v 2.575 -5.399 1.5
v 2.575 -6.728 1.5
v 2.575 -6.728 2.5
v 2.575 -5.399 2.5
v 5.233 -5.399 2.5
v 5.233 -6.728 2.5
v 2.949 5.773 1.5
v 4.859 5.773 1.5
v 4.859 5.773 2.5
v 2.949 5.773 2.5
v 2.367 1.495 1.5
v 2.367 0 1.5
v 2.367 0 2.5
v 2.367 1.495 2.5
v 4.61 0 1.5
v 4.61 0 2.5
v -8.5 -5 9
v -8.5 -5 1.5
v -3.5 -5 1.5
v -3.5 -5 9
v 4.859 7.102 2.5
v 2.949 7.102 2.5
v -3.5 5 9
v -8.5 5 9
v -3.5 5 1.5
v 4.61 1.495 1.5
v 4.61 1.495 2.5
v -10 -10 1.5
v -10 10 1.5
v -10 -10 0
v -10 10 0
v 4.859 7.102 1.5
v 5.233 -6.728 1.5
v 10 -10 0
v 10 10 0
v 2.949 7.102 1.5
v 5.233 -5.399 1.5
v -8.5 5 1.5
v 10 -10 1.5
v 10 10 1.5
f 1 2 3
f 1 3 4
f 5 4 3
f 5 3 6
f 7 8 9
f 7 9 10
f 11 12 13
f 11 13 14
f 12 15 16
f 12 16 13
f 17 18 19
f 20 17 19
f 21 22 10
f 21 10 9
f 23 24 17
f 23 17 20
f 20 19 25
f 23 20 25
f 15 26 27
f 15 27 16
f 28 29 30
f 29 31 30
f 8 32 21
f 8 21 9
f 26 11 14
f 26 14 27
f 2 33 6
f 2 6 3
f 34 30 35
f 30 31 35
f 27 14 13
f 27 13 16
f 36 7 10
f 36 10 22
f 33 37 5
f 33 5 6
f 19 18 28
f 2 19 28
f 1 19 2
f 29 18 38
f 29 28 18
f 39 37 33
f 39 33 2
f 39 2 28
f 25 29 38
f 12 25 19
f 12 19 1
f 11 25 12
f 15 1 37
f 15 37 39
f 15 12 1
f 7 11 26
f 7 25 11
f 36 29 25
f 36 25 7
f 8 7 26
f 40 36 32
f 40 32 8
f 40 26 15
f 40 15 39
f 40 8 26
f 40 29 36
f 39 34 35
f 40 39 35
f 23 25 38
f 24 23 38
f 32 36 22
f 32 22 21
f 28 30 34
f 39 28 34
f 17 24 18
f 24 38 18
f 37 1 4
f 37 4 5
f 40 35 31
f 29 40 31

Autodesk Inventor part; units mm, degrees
ref_plane "YZ Plane" through (0, 0, 0) normal (1, 0, 0) x (0, 1, 0)
ref_plane "XZ Plane" through (0, 0, 0) normal (0, 1, 0) x (-1, 0, 0)
ref_plane "XY Plane" through (0, 0, 0) normal (0, 0, 1) x (1, 0, 0)
sketch "Sketch1" plane through (0, 0, 0) normal (0, 0, 1) x (1, 0, 0)
  line L0 (-10, -10) -> (10, -10)
  line L1 (10, -10) -> (10, 10)
  line L2 (10, 10) -> (-10, 10)
  line L3 (-10, 10) -> (-10, -10)
  line L4 (-10, -10) -> (10, 10) construction
  line L5 (10, -10) -> (-10, 10) construction
  point P0 (0, 0)
  dimension "d0" = 20
  dimension "d1" = 20
extrude "Extrusion1" add sketch "Sketch1" along normal blind 1.5
sketch "Sketch2" plane through (0, 0, 1.5) normal (0, 0, 1) x (1, 0, 0)
  line L0 (-14, 0) -> (14, 0) projected
  line L1 (-8.5, -5) -> (-3.5, -5)
  line L2 (-3.5, -5) -> (-3.5, 5)
  line L3 (-3.5, 5) -> (-8.5, 5)
  line L4 (-8.5, 5) -> (-8.5, -5)
  line L5 (-8.5, -5) -> (-3.5, 5) construction
  line L6 (-3.5, -5) -> (-8.5, 5) construction
  line L7 (-10, 10) -> (-10, -10) projected
  point P0 (0, 0)
  point P1 (-6, 0)
  dimension "d4" = 1.5
  dimension "d5" = 10
  dimension "d6" = 5
extrude "Extrusion2" add sketch "Sketch2" along normal blind 7.5
sketch "Sketch3" plane through (0, 0, 1.5) normal (0, 0, 1) x (1, 0, 0)
  line L0 (2.9488, 7.102) -> (4.8593, 7.102)
  line L1 (4.8593, 7.102) -> (4.8593, 5.773)
  line L2 (4.8593, 5.773) -> (2.9488, 5.773)
  line L3 (2.9488, 5.773) -> (2.9488, 7.102)
  line L4 (2.9488, 7.102) -> (4.8593, 5.773) construction
  line L5 (4.8593, 7.102) -> (2.9488, 5.773) construction
  line L6 (2.3673, 1.4952) -> (4.6101, 1.4952)
  line L7 (4.6101, 1.4952) -> (4.6101, 0)
  line L8 (4.6101, 0) -> (2.3673, 0)
  line L9 (2.3673, 0) -> (2.3673, 1.4952)
  line L10 (2.3673, 1.4952) -> (4.6101, 0) construction
  line L11 (4.6101, 1.4952) -> (2.3673, 0) construction
  line L12 (2.575, -5.3992) -> (5.233, -5.3992)
  line L13 (5.233, -5.3992) -> (5.233, -6.7282)
  line L14 (5.233, -6.7282) -> (2.575, -6.7282)
  line L15 (2.575, -6.7282) -> (2.575, -5.3992)
  line L16 (2.575, -5.3992) -> (5.233, -6.7282) construction
  line L17 (5.233, -5.3992) -> (2.575, -6.7282) construction
  point P0 (0, 0)
  point P1 (3.904, 6.4375)
  point P2 (3.4887, 0.7476)
  point P3 (3.904, -6.0637)
extrude "Extrusion3" add sketch "Sketch3" along normal blind 1
properties part number "sunlightsensor"
